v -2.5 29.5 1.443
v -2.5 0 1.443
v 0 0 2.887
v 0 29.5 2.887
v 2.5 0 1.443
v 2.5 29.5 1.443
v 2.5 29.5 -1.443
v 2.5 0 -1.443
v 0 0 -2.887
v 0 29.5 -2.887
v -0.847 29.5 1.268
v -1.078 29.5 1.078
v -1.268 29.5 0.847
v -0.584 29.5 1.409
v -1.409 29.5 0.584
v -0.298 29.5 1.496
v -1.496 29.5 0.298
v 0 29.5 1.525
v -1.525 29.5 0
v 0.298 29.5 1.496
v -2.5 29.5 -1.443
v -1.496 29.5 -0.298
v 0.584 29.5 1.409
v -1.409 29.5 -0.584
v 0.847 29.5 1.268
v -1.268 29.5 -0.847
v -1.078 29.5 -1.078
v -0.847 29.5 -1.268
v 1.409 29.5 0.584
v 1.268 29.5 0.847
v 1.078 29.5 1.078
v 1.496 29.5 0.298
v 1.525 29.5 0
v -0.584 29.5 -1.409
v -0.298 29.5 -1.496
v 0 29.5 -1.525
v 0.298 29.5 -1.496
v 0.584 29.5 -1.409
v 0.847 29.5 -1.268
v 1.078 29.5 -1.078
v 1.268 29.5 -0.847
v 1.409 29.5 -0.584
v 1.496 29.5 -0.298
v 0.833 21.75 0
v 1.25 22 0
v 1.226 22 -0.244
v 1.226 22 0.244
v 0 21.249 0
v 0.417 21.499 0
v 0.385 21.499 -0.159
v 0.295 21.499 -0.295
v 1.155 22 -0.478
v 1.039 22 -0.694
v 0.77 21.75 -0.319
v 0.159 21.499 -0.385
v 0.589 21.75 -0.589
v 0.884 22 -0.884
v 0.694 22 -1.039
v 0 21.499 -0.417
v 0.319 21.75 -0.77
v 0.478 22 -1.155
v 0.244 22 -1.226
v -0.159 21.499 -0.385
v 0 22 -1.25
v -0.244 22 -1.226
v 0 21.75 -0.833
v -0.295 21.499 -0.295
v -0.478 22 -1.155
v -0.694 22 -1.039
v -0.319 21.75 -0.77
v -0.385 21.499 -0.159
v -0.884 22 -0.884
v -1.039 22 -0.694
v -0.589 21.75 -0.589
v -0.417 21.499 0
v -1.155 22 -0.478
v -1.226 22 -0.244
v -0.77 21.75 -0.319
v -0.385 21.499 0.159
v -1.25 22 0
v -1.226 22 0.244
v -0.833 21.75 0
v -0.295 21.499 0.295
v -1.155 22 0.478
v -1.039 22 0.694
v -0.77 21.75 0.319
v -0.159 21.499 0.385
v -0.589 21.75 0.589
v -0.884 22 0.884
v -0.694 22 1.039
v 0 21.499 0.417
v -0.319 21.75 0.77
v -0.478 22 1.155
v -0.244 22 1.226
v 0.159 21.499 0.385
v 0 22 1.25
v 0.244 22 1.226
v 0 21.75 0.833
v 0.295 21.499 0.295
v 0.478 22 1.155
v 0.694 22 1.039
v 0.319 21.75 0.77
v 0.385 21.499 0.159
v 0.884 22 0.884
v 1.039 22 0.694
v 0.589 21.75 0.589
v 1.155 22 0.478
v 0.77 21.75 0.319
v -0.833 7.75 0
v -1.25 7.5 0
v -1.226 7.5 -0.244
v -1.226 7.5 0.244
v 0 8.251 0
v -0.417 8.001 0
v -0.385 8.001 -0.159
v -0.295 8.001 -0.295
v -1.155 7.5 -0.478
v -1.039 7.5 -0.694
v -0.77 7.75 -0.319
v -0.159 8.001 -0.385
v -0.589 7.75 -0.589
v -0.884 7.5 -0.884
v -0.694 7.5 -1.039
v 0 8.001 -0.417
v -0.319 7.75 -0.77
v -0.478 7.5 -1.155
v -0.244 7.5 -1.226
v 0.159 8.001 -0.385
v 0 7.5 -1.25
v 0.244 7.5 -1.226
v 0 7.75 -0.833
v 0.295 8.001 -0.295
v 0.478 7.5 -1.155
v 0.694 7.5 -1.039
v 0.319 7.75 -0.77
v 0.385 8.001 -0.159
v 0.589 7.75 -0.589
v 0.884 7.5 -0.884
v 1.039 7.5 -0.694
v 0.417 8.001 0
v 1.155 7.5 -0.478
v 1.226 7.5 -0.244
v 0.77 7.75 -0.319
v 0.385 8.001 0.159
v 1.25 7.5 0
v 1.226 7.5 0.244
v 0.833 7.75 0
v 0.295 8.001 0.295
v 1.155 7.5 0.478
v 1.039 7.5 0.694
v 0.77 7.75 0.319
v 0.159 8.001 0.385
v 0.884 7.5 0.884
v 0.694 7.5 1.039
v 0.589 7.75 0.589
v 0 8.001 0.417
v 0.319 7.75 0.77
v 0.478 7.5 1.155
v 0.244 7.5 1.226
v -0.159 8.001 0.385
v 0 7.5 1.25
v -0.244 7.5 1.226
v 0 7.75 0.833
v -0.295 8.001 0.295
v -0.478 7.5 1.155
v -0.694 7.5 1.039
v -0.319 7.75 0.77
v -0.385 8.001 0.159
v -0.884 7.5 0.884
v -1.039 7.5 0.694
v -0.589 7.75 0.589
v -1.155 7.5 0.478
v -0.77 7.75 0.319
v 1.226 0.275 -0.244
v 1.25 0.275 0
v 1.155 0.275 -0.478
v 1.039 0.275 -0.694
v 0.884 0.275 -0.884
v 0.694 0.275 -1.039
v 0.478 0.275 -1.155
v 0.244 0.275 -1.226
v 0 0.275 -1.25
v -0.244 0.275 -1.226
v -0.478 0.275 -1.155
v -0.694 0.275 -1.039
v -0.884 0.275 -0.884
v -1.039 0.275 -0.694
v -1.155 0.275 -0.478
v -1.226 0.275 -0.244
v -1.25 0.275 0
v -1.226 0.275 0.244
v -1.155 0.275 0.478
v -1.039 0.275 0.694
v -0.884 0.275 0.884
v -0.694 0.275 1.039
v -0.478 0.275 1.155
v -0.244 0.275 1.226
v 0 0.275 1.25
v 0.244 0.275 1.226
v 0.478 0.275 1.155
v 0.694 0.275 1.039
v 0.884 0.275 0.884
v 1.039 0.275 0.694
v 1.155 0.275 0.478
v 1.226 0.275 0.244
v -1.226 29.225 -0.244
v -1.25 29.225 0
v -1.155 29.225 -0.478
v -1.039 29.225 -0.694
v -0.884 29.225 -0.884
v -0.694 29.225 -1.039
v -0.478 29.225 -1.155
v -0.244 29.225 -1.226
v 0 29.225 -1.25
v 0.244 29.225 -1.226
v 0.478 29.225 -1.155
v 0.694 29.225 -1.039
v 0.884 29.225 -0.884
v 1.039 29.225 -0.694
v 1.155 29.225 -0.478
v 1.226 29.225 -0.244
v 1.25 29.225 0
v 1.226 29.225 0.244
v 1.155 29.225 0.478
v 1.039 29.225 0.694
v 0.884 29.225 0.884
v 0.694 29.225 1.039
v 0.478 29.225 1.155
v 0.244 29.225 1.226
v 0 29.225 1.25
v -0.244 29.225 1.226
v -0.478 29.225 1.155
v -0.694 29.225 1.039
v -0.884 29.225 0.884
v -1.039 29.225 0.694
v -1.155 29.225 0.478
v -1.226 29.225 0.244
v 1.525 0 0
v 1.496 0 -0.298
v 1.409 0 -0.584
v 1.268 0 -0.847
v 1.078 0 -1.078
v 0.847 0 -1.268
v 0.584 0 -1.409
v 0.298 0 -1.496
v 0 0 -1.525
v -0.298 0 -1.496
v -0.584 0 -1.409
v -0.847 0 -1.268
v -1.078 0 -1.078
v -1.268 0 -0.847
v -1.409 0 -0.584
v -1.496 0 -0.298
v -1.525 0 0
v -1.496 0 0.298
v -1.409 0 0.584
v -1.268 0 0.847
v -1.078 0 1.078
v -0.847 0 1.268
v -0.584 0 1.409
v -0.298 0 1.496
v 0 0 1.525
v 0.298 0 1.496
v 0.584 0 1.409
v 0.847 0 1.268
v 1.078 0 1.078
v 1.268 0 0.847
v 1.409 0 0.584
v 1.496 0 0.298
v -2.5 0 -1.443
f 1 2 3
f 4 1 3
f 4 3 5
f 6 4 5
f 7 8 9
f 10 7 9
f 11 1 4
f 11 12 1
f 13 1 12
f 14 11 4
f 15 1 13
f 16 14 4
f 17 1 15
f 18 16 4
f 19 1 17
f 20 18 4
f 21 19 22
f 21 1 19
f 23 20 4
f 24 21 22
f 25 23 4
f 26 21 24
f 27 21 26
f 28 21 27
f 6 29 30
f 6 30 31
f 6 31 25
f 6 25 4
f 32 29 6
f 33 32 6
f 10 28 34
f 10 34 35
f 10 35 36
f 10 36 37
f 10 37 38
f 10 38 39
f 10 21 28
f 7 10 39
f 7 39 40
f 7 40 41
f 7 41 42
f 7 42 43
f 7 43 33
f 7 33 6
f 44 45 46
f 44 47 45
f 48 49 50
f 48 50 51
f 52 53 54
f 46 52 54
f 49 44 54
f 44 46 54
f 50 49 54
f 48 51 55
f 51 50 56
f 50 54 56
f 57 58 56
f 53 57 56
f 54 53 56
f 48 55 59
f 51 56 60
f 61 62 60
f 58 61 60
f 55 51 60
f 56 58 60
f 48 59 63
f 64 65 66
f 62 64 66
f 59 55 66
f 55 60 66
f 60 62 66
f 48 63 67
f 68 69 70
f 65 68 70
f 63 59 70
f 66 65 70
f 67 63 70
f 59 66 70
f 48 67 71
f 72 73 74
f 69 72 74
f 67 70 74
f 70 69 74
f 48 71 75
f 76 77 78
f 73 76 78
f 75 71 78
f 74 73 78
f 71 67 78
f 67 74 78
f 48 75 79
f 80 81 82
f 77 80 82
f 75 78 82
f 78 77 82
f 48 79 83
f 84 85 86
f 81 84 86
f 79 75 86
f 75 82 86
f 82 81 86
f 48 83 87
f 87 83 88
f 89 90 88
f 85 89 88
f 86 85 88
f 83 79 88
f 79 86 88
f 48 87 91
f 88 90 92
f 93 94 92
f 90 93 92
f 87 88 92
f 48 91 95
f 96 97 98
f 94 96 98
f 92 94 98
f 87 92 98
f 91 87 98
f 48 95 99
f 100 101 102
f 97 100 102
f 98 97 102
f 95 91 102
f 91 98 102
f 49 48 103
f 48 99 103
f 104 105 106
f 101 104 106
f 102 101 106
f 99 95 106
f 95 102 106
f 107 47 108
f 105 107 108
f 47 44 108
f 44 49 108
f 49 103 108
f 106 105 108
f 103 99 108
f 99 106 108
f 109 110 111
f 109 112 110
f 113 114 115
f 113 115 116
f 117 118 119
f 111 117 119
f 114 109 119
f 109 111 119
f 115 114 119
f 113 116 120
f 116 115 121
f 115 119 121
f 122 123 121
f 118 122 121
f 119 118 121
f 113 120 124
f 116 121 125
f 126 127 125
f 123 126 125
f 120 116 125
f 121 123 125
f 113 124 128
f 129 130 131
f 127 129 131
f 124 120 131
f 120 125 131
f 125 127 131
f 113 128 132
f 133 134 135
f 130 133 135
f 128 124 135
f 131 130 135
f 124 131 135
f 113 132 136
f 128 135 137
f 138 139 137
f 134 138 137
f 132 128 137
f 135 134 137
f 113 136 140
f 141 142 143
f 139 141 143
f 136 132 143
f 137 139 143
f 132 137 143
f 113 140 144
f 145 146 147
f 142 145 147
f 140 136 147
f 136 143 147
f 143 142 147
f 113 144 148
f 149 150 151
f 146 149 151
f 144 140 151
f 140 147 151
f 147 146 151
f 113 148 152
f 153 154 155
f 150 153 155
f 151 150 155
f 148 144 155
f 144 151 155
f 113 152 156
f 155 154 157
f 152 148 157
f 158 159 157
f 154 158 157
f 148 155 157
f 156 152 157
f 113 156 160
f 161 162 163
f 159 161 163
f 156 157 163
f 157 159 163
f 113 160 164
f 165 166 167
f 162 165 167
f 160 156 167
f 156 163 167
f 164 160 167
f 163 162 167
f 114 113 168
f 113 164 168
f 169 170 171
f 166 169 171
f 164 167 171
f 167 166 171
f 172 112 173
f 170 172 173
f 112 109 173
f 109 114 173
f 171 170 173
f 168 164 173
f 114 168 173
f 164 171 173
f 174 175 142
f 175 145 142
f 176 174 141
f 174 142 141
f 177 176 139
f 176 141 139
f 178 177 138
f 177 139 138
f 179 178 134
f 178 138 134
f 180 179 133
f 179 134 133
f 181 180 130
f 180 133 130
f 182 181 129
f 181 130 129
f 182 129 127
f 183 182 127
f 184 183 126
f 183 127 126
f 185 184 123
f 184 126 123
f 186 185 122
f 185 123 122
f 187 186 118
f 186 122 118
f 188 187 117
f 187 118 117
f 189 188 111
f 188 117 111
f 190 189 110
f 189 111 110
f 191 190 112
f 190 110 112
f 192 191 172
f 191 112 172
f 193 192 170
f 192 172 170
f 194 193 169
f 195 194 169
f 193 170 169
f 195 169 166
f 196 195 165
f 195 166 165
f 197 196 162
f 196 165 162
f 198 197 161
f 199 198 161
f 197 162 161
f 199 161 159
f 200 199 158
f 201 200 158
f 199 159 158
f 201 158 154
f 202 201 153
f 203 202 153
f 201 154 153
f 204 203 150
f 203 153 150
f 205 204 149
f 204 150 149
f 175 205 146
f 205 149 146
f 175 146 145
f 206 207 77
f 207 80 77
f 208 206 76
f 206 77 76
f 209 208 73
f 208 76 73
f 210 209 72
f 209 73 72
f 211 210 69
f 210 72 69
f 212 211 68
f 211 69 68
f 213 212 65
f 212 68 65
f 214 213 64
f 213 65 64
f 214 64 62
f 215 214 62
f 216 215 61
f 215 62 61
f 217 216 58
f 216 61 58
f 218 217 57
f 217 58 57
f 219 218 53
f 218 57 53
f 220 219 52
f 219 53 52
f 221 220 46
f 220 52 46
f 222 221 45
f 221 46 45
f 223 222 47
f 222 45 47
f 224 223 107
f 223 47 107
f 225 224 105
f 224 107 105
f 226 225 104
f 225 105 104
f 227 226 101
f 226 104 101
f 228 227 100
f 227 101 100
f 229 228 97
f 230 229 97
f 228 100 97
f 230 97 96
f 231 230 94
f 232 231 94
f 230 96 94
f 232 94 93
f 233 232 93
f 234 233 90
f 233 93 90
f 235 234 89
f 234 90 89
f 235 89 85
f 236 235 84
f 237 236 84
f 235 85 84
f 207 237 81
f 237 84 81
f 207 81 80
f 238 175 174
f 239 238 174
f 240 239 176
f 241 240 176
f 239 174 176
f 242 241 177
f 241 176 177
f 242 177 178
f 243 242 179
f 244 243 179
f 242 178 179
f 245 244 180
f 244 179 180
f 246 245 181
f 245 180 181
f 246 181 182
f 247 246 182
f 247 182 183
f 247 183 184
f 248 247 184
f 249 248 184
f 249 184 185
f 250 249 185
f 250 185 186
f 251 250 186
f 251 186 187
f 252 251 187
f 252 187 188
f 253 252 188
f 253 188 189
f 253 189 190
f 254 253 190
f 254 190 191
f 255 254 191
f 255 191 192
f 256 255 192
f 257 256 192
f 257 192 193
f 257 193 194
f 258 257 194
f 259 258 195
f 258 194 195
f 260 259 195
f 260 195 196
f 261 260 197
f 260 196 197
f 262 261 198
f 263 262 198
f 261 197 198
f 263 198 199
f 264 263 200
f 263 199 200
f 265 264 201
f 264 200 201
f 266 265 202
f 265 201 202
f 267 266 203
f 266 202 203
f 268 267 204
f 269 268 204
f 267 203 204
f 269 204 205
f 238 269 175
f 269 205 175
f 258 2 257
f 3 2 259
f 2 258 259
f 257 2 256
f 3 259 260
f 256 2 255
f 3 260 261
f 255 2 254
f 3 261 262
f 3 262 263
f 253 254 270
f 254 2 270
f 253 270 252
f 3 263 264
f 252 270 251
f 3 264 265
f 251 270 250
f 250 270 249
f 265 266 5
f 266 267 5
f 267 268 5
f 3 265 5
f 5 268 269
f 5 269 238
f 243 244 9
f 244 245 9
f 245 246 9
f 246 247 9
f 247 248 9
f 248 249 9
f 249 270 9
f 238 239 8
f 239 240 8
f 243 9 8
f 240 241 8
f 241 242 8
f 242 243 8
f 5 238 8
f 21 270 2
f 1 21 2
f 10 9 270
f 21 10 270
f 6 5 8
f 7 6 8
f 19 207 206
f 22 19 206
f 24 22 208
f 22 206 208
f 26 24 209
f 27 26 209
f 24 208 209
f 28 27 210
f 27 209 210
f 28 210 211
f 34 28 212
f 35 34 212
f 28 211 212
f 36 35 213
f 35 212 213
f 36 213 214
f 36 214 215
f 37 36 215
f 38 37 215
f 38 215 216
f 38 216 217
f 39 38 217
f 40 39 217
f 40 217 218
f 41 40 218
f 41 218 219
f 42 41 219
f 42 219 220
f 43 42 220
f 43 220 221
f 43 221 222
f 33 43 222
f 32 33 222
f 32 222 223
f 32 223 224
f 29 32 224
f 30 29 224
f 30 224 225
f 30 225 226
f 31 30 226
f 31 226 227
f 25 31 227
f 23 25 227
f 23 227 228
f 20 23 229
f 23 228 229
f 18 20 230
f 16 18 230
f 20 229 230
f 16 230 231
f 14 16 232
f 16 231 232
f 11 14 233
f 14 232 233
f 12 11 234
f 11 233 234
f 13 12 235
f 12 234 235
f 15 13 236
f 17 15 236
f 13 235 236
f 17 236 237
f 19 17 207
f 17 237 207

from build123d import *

# Parameters (mm, degrees)
BOSS_EXTRUDE1_DEPTH         = 29.5
M3_TAPPED_HOLE1_D           = 2.5
M3_TAPPED_HOLE1_DEPTH       = 7.5
M3_TAPPED_HOLE1_CSINK_D     = 3.05
M3_TAPPED_HOLE1_CSINK_ANGLE = 90
M3_TAPPED_HOLE1_TIP         = 0.751075774
M3_TAPPED_HOLE2_D           = 2.5
M3_TAPPED_HOLE2_DEPTH       = 7.5
M3_TAPPED_HOLE2_CSINK_D     = 3.05
M3_TAPPED_HOLE2_CSINK_ANGLE = 90
M3_TAPPED_HOLE2_TIP         = 0.751075774


with BuildPart() as part:
    # Sketch1 → Boss-Extrude1 (new body)
    with BuildSketch(Plane(origin=(0, 0, 0), x_dir=(1, 0, 0), z_dir=(0, 1, 0))):
        Polygon((-2.5, 1.443375673), (-2.5, -1.443375673), (0, -2.886751346), (2.5, -1.443375673), (2.5, 1.443375673), (0, 2.886751346), align=None)
    extrude(amount=BOSS_EXTRUDE1_DEPTH)

    # M3 Tapped Hole1
    with Locations(Plane(origin=(0, 29.5, 0), x_dir=(1, 0, 0), z_dir=(0, 1, 0))):
        with Locations((0, 0)):
            CounterSinkHole(M3_TAPPED_HOLE1_D / 2, M3_TAPPED_HOLE1_CSINK_D / 2, depth=M3_TAPPED_HOLE1_DEPTH, counter_sink_angle=M3_TAPPED_HOLE1_CSINK_ANGLE)
            with Locations((0, 0, -(M3_TAPPED_HOLE1_DEPTH + M3_TAPPED_HOLE1_TIP / 2))):  # 118° drill point
                Cone(0, M3_TAPPED_HOLE1_D / 2, M3_TAPPED_HOLE1_TIP, mode=Mode.SUBTRACT)

    # M3 Tapped Hole2
    with Locations(Plane(origin=(0, 0, 0), x_dir=(-1, 0, 0), z_dir=(0, -1, 0))):
        with Locations((0, 0)):
            CounterSinkHole(M3_TAPPED_HOLE2_D / 2, M3_TAPPED_HOLE2_CSINK_D / 2, depth=M3_TAPPED_HOLE2_DEPTH, counter_sink_angle=M3_TAPPED_HOLE2_CSINK_ANGLE)
            with Locations((0, 0, -(M3_TAPPED_HOLE2_DEPTH + M3_TAPPED_HOLE2_TIP / 2))):  # 118° drill point
                Cone(0, M3_TAPPED_HOLE2_D / 2, M3_TAPPED_HOLE2_TIP, mode=Mode.SUBTRACT)


solid = part.part
